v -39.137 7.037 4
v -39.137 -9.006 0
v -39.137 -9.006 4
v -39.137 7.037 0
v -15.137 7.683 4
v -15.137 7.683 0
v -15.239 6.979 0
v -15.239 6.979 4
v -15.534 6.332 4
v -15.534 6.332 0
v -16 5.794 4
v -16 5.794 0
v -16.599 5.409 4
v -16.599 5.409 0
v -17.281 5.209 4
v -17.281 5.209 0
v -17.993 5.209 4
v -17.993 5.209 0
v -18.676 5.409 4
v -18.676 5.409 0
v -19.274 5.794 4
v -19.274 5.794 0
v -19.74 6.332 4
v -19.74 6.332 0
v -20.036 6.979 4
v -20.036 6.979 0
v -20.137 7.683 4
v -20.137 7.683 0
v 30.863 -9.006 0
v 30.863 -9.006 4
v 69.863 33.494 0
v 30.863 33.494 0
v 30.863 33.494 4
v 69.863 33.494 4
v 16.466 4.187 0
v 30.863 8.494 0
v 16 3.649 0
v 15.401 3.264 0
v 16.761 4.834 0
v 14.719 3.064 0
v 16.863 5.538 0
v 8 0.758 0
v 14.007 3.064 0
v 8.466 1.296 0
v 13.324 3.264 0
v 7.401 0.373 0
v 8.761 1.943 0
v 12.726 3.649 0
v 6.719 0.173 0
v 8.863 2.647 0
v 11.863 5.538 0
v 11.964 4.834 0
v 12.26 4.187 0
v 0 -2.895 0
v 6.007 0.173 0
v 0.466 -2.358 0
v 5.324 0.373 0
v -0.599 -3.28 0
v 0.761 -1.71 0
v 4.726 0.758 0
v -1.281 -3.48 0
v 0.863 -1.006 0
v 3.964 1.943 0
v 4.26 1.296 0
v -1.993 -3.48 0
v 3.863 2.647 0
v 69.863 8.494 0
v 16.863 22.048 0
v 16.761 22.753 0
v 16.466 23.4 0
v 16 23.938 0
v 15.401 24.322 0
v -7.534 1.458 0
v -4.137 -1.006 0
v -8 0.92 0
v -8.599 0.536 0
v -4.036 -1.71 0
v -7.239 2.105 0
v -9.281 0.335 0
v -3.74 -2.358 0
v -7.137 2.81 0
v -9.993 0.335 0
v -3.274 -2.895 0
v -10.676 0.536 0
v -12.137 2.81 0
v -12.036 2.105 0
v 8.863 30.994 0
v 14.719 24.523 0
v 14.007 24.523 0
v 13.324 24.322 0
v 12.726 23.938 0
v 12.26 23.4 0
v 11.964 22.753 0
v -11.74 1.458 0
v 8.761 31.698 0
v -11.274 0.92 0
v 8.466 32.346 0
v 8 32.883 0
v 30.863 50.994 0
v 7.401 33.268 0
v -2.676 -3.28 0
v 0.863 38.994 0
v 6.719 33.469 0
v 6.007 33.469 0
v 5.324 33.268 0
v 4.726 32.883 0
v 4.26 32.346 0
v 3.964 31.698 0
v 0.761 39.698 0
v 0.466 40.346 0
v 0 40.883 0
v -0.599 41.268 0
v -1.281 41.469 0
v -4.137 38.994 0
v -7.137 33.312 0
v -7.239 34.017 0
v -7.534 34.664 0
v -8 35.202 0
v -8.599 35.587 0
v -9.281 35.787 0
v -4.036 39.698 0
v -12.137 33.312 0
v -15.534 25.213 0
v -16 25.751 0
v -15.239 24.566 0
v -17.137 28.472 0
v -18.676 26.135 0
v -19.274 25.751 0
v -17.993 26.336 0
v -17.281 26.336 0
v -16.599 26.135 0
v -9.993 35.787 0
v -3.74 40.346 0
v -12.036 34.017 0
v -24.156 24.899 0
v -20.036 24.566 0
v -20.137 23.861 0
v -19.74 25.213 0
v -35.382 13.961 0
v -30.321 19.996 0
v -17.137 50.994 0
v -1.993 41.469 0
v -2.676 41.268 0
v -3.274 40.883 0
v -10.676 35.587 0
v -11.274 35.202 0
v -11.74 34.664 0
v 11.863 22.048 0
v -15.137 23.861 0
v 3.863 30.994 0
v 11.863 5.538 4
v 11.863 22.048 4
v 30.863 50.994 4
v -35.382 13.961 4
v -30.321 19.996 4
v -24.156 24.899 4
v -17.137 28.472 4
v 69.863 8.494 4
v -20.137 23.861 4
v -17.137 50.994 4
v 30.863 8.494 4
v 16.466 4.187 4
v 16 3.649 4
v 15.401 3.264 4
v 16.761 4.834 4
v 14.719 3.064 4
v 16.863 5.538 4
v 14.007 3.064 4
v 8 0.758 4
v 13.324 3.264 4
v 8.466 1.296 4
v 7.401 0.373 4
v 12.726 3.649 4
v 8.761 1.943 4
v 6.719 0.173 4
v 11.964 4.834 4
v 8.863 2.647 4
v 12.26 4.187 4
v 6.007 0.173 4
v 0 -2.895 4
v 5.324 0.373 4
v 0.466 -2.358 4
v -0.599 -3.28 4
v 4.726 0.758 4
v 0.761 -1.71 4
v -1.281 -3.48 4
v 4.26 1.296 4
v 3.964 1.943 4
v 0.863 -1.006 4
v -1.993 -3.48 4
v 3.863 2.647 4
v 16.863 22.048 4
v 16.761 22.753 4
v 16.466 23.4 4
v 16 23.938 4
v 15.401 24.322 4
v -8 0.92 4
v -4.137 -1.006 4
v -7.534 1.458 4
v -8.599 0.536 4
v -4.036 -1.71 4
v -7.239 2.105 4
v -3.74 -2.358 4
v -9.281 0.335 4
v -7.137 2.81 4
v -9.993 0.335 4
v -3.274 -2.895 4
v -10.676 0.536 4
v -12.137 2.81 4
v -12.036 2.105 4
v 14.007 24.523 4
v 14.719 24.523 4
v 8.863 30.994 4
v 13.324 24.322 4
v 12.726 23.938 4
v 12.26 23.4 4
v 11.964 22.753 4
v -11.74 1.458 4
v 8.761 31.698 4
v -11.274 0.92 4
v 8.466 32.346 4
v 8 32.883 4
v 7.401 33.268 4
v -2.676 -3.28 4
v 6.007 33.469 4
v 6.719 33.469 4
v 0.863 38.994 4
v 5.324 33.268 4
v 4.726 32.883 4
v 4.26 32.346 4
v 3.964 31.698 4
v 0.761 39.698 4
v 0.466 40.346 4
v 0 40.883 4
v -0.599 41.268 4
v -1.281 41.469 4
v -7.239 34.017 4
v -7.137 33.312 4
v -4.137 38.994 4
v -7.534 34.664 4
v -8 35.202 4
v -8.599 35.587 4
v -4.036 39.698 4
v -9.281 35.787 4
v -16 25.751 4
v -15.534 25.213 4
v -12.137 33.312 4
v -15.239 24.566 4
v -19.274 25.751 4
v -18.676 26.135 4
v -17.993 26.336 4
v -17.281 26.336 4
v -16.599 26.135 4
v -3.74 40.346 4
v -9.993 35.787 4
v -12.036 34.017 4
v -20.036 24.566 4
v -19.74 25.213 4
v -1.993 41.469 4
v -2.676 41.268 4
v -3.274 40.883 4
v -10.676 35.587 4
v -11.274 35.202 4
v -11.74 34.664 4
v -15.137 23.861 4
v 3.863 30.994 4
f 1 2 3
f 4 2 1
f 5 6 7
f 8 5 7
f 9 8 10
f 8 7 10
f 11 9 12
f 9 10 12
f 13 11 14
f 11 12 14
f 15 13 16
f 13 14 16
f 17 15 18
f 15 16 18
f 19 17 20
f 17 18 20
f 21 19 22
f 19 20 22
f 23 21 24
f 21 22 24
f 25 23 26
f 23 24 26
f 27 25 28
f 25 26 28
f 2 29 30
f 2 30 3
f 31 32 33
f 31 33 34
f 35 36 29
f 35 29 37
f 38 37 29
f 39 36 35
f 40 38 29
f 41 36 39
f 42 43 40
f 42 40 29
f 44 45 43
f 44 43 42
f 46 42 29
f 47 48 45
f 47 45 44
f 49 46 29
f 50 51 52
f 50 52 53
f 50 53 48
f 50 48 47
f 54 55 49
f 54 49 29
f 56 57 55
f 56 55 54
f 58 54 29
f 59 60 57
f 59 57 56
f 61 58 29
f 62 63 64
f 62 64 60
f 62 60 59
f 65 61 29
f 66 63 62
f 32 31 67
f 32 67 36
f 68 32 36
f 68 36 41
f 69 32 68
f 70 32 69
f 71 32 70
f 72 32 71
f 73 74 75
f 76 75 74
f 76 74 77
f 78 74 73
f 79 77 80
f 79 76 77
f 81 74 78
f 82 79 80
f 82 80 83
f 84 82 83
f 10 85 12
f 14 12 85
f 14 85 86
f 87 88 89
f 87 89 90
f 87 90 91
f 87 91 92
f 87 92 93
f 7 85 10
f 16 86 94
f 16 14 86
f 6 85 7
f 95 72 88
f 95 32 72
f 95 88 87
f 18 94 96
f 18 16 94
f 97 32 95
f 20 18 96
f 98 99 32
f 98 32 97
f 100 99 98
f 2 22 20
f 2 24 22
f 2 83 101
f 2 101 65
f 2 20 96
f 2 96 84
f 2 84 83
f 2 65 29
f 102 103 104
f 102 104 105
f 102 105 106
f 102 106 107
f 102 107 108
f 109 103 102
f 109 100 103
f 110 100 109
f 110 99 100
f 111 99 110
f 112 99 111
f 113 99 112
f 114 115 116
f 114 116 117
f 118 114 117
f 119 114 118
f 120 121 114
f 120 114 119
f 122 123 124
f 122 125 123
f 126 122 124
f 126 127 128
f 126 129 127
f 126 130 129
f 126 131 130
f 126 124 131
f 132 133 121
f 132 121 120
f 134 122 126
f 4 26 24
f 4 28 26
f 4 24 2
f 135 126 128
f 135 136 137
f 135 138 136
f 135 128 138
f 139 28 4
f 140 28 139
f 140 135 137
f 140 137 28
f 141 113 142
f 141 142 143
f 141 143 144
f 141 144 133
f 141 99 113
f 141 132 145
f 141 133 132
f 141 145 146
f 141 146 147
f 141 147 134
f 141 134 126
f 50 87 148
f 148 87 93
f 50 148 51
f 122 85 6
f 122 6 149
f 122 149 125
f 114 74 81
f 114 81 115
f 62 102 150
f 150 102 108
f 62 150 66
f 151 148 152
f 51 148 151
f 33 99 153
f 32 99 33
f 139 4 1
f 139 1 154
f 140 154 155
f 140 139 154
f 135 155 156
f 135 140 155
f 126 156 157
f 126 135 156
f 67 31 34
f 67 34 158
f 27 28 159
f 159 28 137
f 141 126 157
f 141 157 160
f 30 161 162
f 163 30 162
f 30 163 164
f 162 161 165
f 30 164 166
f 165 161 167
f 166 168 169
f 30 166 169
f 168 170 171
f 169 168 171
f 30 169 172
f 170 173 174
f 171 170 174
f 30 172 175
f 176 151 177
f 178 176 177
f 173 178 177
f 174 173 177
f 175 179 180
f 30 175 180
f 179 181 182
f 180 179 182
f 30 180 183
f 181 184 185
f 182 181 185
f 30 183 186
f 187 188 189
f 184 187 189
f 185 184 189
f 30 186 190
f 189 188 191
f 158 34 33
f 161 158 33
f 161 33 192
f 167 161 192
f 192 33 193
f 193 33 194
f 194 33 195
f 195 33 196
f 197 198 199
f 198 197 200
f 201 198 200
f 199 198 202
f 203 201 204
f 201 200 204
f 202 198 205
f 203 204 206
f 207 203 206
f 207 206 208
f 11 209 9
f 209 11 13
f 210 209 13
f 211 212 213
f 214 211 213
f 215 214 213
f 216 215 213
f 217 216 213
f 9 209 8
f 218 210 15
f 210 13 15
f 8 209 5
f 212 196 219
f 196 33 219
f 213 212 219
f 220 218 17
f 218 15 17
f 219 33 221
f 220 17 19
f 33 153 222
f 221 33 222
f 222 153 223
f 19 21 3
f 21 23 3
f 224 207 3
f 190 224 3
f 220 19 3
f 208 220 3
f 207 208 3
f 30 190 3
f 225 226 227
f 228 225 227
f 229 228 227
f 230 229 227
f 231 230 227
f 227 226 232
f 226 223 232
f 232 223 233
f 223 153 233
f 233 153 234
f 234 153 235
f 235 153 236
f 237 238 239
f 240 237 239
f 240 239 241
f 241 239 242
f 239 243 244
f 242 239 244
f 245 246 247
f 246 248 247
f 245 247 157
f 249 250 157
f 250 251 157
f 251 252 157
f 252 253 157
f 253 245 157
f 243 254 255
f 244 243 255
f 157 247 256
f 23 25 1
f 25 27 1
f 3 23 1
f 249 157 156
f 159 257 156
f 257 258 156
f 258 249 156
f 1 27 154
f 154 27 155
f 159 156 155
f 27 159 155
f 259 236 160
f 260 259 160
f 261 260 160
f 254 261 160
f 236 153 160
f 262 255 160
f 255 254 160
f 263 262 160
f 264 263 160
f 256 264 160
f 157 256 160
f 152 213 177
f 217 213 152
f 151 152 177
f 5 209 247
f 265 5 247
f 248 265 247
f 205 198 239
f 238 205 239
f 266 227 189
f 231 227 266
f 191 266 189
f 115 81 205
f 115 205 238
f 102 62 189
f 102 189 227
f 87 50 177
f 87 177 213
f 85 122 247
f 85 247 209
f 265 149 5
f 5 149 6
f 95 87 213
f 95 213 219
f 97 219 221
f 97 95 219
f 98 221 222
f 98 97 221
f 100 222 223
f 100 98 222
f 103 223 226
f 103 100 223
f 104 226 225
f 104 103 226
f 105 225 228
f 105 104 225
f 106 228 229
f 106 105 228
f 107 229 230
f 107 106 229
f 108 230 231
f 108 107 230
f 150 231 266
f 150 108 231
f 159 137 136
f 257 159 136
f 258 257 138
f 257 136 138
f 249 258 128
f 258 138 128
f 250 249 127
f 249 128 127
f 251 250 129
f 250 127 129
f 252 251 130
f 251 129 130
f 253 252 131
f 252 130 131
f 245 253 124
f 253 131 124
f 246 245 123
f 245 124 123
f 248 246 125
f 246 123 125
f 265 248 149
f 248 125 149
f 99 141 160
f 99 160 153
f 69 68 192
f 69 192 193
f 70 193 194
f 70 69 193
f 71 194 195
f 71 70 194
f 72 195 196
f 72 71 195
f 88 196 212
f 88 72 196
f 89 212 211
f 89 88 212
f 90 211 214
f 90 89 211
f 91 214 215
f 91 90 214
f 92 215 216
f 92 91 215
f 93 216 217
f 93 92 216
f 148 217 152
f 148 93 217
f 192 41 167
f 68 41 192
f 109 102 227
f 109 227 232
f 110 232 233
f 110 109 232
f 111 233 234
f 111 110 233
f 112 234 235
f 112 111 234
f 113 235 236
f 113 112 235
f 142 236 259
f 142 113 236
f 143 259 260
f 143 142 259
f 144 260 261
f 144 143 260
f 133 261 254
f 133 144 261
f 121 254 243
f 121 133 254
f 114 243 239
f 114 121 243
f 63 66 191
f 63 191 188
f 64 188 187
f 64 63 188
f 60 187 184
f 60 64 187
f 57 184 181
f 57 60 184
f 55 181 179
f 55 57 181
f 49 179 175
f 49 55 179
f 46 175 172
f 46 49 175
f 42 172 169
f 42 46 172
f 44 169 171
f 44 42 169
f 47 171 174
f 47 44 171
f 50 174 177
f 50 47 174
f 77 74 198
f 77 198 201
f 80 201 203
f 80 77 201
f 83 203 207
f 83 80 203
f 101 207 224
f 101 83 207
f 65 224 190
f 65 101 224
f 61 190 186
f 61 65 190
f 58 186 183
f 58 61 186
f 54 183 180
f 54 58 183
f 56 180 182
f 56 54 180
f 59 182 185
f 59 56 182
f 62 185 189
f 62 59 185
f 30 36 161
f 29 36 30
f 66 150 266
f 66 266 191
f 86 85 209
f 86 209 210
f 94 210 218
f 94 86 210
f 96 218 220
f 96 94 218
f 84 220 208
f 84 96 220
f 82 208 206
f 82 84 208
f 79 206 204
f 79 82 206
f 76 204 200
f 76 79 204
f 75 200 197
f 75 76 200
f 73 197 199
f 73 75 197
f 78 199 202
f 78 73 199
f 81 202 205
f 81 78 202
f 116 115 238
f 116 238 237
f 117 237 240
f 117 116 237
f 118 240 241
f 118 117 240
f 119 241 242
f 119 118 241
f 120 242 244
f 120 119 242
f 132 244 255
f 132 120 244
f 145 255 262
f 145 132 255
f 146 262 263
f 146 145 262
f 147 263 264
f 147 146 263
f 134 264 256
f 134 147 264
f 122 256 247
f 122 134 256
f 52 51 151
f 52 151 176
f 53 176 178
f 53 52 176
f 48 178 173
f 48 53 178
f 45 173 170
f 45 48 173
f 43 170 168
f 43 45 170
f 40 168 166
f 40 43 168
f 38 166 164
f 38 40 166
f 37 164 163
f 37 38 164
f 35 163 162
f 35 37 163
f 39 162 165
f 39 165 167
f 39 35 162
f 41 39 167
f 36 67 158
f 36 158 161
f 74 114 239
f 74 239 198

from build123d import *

# Parameters (mm, degrees)
BOSS_EXTRUDE1_DEPTH = 4


with BuildPart() as part:
    # Sketch1 → Boss-Extrude1 (new body)
    with BuildSketch(Plane.XY):
        with BuildLine():
            Line((30.862718171, 33.494054131), (69.862718171, 33.494054131))
            Line((69.862718171, 33.494054131), (69.862718171, 8.494054131))
            Line((69.862718171, 8.494054131), (30.862718171, 8.494054131))
            Line((30.862718171, 8.494054131), (30.862718171, -9.005945869))
            Line((30.862718171, -9.005945869), (-39.137281829, -9.005945869))
            Line((-39.137281829, -9.005945869), (-39.137281829, 7.037446143))
            ThreePointArc((-39.137281829, 7.037446143), (-30.320886371, 19.996051834), (-17.137281829, 28.472304637))
            Line((-17.137281829, 28.472304637), (-17.137281829, 50.994054131))
            Line((-17.137281829, 50.994054131), (30.862718171, 50.994054131))
            Line((30.862718171, 50.994054131), (30.862718171, 33.494054131))
        make_face()
        with BuildLine():
            Line((-4.137281829, 38.994054131), (-4.137281829, -1.005945869))
            ThreePointArc((-4.137281829, -1.005945869), (-1.637281829, -3.505945869), (0.862718171, -1.005945869))
            Line((0.862718171, -1.005945869), (0.862718171, 38.994054131))
            ThreePointArc((0.862718171, 38.994054131), (-1.637281829, 41.494054131), (-4.137281829, 38.994054131))
        make_face(mode=Mode.SUBTRACT)
        with BuildLine():
            Line((-12.137281829, 33.312431903), (-12.137281829, 2.809827896))
            ThreePointArc((-12.137281829, 2.809827896), (-9.637281829, 0.309827896), (-7.137281829, 2.809827896))
            Line((-7.137281829, 2.809827896), (-7.137281829, 33.312431903))
            ThreePointArc((-7.137281829, 33.312431903), (-9.637281829, 35.812431903), (-12.137281829, 33.312431903))
        make_face(mode=Mode.SUBTRACT)
        with BuildLine():
            Line((-15.137281829, 23.861283589), (-15.137281829, 7.683449462))
            ThreePointArc((-15.137281829, 7.683449462), (-17.637281829, 5.183449462), (-20.137281829, 7.683449462))
            Line((-20.137281829, 7.683449462), (-20.137281829, 23.861283589))
            ThreePointArc((-20.137281829, 23.861283589), (-17.637281829, 26.361283589), (-15.137281829, 23.861283589))
        make_face(mode=Mode.SUBTRACT)
        with BuildLine():
            Line((3.862718171, 30.994054131), (3.862718171, 2.647434443))
            ThreePointArc((3.862718171, 2.647434443), (6.362718171, 0.147434443), (8.862718171, 2.647434443))
            Line((8.862718171, 2.647434443), (8.862718171, 30.994054131))
            ThreePointArc((8.862718171, 30.994054131), (6.362718171, 33.494054131), (3.862718171, 30.994054131))
        make_face(mode=Mode.SUBTRACT)
        with BuildLine():
            Line((11.862718171, 22.048271006), (11.862718171, 5.538473012))
            ThreePointArc((11.862718171, 5.538473012), (14.362718171, 3.038473012), (16.862718171, 5.538473012))
            Line((16.862718171, 5.538473012), (16.862718171, 22.048271006))
            ThreePointArc((16.862718171, 22.048271006), (14.362718171, 24.548271006), (11.862718171, 22.048271006))
        make_face(mode=Mode.SUBTRACT)
    extrude(amount=BOSS_EXTRUDE1_DEPTH)


solid = part.part
